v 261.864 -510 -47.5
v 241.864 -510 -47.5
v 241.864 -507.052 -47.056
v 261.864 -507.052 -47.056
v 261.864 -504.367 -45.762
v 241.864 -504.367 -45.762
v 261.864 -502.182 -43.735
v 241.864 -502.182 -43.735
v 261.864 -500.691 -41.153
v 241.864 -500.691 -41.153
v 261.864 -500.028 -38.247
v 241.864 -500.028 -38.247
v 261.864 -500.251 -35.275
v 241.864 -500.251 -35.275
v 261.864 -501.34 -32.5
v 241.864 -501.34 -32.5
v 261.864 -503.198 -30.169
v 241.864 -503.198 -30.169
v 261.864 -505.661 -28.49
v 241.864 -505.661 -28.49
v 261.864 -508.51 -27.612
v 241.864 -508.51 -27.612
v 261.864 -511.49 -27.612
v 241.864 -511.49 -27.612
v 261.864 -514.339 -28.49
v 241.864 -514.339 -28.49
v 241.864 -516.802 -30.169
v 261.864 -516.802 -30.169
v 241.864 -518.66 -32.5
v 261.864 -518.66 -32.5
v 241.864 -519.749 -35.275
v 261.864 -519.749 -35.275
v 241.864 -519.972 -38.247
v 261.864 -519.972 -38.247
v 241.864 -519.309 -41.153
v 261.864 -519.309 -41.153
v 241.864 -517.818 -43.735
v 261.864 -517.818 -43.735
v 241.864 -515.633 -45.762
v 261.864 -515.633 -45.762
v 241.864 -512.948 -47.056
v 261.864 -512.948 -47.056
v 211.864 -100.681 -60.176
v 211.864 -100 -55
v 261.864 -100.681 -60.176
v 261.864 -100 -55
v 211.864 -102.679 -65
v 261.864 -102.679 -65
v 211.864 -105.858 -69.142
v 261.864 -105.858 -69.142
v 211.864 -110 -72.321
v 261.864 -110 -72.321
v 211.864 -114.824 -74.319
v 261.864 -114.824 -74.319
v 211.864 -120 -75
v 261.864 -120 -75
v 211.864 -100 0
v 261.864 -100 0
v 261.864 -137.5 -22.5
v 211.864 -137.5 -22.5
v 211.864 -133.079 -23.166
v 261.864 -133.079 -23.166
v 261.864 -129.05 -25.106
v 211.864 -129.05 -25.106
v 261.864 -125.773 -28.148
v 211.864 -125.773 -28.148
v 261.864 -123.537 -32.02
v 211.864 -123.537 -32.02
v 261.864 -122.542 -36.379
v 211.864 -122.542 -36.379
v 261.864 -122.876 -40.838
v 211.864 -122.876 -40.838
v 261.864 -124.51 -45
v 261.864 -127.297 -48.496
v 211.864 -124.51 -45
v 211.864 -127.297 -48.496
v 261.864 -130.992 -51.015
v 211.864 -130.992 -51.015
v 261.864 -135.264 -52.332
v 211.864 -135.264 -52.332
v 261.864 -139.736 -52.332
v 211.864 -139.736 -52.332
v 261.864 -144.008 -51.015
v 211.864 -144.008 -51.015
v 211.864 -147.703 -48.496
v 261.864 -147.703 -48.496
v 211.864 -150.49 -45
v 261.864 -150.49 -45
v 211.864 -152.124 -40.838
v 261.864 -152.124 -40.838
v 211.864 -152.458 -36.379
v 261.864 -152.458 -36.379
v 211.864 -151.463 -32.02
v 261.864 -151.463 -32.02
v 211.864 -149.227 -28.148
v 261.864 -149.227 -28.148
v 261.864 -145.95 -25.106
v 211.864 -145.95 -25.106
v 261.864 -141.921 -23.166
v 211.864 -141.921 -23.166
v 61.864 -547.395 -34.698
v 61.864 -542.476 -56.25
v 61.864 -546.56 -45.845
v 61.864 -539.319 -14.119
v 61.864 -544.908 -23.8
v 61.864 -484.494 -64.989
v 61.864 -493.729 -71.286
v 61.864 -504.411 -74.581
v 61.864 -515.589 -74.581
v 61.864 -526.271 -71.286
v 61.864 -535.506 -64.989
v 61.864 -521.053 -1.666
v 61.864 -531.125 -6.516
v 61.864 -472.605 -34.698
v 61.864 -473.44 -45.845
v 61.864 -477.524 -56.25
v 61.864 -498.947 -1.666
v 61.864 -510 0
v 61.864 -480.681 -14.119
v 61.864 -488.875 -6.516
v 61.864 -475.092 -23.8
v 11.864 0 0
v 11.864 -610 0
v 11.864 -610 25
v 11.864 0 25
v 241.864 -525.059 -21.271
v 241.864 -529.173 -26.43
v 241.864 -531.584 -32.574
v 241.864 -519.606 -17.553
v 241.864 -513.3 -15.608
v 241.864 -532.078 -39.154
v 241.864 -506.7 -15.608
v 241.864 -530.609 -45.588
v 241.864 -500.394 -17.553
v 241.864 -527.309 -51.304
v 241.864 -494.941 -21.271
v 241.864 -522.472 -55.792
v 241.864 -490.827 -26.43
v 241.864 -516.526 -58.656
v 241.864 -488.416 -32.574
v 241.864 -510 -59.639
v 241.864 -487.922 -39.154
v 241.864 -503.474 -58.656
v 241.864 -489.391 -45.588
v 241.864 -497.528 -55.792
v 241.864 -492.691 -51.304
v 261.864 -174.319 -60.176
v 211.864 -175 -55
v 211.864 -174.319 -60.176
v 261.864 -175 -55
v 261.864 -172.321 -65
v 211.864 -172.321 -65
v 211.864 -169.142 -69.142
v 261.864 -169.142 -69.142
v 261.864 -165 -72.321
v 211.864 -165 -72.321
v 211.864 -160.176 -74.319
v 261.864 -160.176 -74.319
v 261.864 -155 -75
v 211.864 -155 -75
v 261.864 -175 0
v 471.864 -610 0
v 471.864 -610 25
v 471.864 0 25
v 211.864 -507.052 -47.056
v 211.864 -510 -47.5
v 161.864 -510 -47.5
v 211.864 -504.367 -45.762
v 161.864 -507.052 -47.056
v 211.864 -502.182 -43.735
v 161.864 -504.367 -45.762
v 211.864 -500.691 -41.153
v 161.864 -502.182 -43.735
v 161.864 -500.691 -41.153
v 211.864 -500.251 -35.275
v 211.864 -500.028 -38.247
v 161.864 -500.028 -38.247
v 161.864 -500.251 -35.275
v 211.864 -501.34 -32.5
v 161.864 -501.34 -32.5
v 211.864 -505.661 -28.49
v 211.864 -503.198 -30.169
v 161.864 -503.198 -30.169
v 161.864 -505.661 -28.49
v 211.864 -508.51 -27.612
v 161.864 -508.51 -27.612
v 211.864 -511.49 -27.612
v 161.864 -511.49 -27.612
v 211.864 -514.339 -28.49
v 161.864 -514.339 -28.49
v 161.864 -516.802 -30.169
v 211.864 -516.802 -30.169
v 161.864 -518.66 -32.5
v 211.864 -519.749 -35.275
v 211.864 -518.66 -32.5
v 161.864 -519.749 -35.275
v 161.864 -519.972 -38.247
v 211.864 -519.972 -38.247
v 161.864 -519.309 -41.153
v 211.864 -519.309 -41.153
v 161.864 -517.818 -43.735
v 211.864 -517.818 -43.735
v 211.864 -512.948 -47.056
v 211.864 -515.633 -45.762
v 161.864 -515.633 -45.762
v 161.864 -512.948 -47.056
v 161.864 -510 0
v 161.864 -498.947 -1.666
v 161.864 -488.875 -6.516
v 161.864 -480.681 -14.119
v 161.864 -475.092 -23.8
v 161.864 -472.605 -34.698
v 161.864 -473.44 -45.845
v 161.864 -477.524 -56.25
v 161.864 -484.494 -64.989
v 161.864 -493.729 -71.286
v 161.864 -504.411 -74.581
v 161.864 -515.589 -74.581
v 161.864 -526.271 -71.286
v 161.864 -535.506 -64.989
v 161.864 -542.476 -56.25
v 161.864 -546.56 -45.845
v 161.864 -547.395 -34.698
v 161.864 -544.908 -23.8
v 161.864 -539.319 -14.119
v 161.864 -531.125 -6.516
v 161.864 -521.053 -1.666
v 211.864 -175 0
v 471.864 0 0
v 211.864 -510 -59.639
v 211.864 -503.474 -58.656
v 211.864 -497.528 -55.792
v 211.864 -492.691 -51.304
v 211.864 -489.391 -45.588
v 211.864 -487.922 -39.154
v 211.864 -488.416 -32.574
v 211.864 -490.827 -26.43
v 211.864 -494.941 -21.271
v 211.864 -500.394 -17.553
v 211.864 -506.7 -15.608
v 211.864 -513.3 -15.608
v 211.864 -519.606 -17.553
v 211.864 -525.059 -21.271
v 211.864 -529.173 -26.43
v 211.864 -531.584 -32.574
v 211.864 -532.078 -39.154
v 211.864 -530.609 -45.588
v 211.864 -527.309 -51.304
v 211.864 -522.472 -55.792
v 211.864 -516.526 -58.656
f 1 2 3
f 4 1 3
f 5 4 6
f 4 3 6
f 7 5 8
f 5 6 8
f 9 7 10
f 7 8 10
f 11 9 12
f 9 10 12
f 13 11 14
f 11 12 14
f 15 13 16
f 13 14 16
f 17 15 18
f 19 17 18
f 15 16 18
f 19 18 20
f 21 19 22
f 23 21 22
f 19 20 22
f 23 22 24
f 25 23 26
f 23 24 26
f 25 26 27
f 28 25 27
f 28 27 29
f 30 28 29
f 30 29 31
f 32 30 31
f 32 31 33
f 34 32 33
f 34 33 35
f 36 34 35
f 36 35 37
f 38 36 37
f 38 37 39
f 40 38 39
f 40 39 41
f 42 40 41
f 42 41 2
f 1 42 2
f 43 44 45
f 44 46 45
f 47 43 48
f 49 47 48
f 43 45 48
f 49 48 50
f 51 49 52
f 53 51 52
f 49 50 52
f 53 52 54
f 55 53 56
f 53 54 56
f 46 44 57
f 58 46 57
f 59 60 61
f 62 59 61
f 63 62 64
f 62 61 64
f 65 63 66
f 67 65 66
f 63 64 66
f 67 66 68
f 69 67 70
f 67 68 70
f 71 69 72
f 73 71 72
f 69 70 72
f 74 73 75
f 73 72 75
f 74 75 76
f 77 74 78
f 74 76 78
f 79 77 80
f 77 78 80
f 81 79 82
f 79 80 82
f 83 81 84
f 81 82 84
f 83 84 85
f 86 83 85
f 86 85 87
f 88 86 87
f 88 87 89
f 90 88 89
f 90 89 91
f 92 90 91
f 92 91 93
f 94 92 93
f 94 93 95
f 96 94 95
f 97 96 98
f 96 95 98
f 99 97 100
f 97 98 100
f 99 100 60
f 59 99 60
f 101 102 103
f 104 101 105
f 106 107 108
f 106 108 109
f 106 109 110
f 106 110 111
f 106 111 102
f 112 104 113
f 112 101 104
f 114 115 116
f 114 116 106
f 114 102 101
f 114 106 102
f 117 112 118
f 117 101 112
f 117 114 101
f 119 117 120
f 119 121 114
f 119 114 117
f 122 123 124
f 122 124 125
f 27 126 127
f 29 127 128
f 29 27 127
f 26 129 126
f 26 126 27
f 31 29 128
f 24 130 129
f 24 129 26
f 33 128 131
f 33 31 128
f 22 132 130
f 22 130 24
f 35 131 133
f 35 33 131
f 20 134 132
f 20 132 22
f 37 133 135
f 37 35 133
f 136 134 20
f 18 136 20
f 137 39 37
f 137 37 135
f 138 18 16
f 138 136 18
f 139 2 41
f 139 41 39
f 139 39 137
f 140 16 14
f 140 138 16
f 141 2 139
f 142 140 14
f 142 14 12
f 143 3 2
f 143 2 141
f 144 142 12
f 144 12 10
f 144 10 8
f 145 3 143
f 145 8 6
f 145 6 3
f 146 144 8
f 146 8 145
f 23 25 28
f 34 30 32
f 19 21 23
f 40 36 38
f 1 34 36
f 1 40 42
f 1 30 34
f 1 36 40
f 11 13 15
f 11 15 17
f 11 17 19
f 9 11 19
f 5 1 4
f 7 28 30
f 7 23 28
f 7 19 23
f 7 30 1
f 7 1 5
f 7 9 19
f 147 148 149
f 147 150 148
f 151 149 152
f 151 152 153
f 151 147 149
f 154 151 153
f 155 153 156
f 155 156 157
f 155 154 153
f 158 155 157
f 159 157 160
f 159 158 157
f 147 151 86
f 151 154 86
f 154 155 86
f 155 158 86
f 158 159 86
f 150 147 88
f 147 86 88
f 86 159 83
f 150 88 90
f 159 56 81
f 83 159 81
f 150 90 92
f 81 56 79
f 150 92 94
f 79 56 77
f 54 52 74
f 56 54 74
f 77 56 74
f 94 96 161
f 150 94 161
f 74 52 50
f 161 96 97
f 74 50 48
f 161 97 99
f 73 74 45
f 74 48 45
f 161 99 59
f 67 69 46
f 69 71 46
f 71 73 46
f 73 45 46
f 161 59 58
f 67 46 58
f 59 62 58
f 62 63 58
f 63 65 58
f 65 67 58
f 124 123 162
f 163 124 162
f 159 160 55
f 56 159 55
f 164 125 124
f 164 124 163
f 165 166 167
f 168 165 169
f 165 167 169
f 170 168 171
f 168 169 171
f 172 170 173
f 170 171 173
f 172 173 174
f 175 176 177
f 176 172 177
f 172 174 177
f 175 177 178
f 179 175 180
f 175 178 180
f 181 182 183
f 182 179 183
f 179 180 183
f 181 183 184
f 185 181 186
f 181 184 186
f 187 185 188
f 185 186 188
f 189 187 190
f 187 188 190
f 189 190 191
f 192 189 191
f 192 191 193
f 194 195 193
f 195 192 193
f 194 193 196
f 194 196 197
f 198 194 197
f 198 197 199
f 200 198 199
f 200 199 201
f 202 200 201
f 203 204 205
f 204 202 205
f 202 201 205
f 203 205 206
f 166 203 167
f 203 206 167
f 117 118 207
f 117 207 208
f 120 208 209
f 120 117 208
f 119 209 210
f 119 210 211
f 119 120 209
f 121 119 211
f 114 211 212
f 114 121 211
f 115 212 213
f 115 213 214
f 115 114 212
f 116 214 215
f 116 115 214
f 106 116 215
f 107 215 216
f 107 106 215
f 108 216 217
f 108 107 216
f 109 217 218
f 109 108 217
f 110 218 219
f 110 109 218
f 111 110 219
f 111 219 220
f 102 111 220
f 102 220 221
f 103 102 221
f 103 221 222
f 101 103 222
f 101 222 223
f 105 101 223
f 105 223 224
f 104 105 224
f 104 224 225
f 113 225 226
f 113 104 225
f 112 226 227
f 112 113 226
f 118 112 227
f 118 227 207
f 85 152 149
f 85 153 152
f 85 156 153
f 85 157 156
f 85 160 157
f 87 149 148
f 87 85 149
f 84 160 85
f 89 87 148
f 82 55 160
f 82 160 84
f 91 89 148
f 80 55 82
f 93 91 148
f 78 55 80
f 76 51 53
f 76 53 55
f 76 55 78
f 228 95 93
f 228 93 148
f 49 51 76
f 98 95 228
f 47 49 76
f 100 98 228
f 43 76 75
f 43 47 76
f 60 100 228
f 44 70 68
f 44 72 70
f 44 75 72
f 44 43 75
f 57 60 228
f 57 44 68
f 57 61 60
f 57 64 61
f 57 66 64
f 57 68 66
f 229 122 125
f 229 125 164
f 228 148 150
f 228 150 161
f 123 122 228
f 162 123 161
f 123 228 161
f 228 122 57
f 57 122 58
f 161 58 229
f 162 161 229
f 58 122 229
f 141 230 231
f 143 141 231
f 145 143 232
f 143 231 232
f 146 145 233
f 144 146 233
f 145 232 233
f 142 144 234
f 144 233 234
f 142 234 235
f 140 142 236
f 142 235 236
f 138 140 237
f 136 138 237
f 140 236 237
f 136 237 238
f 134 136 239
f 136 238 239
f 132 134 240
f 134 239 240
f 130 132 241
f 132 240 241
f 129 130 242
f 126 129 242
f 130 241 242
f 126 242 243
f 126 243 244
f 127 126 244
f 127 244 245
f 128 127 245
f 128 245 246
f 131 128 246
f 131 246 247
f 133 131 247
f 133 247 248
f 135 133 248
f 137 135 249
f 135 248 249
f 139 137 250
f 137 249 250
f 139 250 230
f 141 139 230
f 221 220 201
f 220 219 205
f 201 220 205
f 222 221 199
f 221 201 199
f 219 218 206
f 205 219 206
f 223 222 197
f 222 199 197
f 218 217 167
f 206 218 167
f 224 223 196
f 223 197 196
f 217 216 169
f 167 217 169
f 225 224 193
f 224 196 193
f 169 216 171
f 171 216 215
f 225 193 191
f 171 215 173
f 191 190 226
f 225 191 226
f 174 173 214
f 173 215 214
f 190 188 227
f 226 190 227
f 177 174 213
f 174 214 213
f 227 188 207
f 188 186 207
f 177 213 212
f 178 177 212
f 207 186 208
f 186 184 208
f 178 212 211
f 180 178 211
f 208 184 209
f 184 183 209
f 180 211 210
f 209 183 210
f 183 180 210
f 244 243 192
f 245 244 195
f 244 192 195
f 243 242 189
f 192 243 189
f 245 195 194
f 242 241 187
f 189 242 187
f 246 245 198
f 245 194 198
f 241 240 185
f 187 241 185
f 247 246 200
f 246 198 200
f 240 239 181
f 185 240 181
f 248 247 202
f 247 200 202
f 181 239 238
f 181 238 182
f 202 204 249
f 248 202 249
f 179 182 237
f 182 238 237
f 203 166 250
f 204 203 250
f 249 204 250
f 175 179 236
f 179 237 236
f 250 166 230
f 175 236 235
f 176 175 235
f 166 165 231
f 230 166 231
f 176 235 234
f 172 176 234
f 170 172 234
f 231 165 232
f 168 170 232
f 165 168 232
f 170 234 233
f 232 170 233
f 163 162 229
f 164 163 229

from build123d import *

# Parameters (mm, degrees)
SKETCH1_W           = 460
SKETCH1_H           = 610
BOSS_EXTRUDE1_DEPTH = 25
BOSS_EXTRUDE2_START = -50
SKETCH2_R           = 37.5
BOSS_EXTRUDE2_DEPTH = 100
SKETCH3_R           = 10
BOSS_EXTRUDE3_DEPTH = 100
BOSS_EXTRUDE4_START = -50
SKETCH4_R           = 22.139424637
BOSS_EXTRUDE4_DEPTH = 30
BOSS_EXTRUDE5_START = -200
SKETCH5_W           = 75
SKETCH5_H           = 75
SKETCH5_R           = 15
BOSS_EXTRUDE5_DEPTH = 50
FILLET1_R           = 20


with BuildPart() as part:
    # Sketch1 → Boss-Extrude1 (new body)
    with BuildSketch(Plane.XY):
        with Locations((241.863857374, -305)):
            Rectangle(SKETCH1_W, SKETCH1_H)
    extrude(amount=BOSS_EXTRUDE1_DEPTH)

    # Sketch5 → Boss-Extrude5 (add)
    with BuildSketch(Plane.ZY.offset(-11.863857374).offset(BOSS_EXTRUDE5_START)):
        with Locations((-37.5, -137.5)):
            Rectangle(SKETCH5_W, SKETCH5_H)
        with Locations((-37.5, -137.5)):
            Circle(SKETCH5_R, mode=Mode.SUBTRACT)
    extrude(amount=-BOSS_EXTRUDE5_DEPTH)

    # Fillet1
    fillet1_edges = [part.edges().sort_by_distance(p)[0] for p in [
        (236.863857374, -100, -75),
        (236.863857374, -175, -75),
    ]]
    fillet(fillet1_edges, radius=FILLET1_R)


with BuildPart() as body_2:
    # Sketch2 → Boss-Extrude2 (new body)
    with BuildSketch(Plane.ZY.offset(-11.863857374).offset(BOSS_EXTRUDE2_START)):
        with Locations((-37.5, -510)):
            Circle(SKETCH2_R)
    extrude(amount=-BOSS_EXTRUDE2_DEPTH)

    # Sketch3 → Boss-Extrude3 (add)
    with BuildSketch(Plane(origin=(161.863857374, 0, 0), x_dir=(0, 0, -1), z_dir=(1, 0, 0))):
        with Locations((37.5, -510)):
            Circle(SKETCH3_R)
    extrude(amount=BOSS_EXTRUDE3_DEPTH)

    # Sketch4 → Boss-Extrude4 (add)
    with BuildSketch(Plane(origin=(261.863857374, 0, 0), x_dir=(0, 0, -1), z_dir=(1, 0, 0)).offset(BOSS_EXTRUDE4_START)):
        with Locations((37.5, -510)):
            Circle(SKETCH4_R)
    extrude(amount=BOSS_EXTRUDE4_DEPTH)


solid = Compound([part.part, body_2.part])
